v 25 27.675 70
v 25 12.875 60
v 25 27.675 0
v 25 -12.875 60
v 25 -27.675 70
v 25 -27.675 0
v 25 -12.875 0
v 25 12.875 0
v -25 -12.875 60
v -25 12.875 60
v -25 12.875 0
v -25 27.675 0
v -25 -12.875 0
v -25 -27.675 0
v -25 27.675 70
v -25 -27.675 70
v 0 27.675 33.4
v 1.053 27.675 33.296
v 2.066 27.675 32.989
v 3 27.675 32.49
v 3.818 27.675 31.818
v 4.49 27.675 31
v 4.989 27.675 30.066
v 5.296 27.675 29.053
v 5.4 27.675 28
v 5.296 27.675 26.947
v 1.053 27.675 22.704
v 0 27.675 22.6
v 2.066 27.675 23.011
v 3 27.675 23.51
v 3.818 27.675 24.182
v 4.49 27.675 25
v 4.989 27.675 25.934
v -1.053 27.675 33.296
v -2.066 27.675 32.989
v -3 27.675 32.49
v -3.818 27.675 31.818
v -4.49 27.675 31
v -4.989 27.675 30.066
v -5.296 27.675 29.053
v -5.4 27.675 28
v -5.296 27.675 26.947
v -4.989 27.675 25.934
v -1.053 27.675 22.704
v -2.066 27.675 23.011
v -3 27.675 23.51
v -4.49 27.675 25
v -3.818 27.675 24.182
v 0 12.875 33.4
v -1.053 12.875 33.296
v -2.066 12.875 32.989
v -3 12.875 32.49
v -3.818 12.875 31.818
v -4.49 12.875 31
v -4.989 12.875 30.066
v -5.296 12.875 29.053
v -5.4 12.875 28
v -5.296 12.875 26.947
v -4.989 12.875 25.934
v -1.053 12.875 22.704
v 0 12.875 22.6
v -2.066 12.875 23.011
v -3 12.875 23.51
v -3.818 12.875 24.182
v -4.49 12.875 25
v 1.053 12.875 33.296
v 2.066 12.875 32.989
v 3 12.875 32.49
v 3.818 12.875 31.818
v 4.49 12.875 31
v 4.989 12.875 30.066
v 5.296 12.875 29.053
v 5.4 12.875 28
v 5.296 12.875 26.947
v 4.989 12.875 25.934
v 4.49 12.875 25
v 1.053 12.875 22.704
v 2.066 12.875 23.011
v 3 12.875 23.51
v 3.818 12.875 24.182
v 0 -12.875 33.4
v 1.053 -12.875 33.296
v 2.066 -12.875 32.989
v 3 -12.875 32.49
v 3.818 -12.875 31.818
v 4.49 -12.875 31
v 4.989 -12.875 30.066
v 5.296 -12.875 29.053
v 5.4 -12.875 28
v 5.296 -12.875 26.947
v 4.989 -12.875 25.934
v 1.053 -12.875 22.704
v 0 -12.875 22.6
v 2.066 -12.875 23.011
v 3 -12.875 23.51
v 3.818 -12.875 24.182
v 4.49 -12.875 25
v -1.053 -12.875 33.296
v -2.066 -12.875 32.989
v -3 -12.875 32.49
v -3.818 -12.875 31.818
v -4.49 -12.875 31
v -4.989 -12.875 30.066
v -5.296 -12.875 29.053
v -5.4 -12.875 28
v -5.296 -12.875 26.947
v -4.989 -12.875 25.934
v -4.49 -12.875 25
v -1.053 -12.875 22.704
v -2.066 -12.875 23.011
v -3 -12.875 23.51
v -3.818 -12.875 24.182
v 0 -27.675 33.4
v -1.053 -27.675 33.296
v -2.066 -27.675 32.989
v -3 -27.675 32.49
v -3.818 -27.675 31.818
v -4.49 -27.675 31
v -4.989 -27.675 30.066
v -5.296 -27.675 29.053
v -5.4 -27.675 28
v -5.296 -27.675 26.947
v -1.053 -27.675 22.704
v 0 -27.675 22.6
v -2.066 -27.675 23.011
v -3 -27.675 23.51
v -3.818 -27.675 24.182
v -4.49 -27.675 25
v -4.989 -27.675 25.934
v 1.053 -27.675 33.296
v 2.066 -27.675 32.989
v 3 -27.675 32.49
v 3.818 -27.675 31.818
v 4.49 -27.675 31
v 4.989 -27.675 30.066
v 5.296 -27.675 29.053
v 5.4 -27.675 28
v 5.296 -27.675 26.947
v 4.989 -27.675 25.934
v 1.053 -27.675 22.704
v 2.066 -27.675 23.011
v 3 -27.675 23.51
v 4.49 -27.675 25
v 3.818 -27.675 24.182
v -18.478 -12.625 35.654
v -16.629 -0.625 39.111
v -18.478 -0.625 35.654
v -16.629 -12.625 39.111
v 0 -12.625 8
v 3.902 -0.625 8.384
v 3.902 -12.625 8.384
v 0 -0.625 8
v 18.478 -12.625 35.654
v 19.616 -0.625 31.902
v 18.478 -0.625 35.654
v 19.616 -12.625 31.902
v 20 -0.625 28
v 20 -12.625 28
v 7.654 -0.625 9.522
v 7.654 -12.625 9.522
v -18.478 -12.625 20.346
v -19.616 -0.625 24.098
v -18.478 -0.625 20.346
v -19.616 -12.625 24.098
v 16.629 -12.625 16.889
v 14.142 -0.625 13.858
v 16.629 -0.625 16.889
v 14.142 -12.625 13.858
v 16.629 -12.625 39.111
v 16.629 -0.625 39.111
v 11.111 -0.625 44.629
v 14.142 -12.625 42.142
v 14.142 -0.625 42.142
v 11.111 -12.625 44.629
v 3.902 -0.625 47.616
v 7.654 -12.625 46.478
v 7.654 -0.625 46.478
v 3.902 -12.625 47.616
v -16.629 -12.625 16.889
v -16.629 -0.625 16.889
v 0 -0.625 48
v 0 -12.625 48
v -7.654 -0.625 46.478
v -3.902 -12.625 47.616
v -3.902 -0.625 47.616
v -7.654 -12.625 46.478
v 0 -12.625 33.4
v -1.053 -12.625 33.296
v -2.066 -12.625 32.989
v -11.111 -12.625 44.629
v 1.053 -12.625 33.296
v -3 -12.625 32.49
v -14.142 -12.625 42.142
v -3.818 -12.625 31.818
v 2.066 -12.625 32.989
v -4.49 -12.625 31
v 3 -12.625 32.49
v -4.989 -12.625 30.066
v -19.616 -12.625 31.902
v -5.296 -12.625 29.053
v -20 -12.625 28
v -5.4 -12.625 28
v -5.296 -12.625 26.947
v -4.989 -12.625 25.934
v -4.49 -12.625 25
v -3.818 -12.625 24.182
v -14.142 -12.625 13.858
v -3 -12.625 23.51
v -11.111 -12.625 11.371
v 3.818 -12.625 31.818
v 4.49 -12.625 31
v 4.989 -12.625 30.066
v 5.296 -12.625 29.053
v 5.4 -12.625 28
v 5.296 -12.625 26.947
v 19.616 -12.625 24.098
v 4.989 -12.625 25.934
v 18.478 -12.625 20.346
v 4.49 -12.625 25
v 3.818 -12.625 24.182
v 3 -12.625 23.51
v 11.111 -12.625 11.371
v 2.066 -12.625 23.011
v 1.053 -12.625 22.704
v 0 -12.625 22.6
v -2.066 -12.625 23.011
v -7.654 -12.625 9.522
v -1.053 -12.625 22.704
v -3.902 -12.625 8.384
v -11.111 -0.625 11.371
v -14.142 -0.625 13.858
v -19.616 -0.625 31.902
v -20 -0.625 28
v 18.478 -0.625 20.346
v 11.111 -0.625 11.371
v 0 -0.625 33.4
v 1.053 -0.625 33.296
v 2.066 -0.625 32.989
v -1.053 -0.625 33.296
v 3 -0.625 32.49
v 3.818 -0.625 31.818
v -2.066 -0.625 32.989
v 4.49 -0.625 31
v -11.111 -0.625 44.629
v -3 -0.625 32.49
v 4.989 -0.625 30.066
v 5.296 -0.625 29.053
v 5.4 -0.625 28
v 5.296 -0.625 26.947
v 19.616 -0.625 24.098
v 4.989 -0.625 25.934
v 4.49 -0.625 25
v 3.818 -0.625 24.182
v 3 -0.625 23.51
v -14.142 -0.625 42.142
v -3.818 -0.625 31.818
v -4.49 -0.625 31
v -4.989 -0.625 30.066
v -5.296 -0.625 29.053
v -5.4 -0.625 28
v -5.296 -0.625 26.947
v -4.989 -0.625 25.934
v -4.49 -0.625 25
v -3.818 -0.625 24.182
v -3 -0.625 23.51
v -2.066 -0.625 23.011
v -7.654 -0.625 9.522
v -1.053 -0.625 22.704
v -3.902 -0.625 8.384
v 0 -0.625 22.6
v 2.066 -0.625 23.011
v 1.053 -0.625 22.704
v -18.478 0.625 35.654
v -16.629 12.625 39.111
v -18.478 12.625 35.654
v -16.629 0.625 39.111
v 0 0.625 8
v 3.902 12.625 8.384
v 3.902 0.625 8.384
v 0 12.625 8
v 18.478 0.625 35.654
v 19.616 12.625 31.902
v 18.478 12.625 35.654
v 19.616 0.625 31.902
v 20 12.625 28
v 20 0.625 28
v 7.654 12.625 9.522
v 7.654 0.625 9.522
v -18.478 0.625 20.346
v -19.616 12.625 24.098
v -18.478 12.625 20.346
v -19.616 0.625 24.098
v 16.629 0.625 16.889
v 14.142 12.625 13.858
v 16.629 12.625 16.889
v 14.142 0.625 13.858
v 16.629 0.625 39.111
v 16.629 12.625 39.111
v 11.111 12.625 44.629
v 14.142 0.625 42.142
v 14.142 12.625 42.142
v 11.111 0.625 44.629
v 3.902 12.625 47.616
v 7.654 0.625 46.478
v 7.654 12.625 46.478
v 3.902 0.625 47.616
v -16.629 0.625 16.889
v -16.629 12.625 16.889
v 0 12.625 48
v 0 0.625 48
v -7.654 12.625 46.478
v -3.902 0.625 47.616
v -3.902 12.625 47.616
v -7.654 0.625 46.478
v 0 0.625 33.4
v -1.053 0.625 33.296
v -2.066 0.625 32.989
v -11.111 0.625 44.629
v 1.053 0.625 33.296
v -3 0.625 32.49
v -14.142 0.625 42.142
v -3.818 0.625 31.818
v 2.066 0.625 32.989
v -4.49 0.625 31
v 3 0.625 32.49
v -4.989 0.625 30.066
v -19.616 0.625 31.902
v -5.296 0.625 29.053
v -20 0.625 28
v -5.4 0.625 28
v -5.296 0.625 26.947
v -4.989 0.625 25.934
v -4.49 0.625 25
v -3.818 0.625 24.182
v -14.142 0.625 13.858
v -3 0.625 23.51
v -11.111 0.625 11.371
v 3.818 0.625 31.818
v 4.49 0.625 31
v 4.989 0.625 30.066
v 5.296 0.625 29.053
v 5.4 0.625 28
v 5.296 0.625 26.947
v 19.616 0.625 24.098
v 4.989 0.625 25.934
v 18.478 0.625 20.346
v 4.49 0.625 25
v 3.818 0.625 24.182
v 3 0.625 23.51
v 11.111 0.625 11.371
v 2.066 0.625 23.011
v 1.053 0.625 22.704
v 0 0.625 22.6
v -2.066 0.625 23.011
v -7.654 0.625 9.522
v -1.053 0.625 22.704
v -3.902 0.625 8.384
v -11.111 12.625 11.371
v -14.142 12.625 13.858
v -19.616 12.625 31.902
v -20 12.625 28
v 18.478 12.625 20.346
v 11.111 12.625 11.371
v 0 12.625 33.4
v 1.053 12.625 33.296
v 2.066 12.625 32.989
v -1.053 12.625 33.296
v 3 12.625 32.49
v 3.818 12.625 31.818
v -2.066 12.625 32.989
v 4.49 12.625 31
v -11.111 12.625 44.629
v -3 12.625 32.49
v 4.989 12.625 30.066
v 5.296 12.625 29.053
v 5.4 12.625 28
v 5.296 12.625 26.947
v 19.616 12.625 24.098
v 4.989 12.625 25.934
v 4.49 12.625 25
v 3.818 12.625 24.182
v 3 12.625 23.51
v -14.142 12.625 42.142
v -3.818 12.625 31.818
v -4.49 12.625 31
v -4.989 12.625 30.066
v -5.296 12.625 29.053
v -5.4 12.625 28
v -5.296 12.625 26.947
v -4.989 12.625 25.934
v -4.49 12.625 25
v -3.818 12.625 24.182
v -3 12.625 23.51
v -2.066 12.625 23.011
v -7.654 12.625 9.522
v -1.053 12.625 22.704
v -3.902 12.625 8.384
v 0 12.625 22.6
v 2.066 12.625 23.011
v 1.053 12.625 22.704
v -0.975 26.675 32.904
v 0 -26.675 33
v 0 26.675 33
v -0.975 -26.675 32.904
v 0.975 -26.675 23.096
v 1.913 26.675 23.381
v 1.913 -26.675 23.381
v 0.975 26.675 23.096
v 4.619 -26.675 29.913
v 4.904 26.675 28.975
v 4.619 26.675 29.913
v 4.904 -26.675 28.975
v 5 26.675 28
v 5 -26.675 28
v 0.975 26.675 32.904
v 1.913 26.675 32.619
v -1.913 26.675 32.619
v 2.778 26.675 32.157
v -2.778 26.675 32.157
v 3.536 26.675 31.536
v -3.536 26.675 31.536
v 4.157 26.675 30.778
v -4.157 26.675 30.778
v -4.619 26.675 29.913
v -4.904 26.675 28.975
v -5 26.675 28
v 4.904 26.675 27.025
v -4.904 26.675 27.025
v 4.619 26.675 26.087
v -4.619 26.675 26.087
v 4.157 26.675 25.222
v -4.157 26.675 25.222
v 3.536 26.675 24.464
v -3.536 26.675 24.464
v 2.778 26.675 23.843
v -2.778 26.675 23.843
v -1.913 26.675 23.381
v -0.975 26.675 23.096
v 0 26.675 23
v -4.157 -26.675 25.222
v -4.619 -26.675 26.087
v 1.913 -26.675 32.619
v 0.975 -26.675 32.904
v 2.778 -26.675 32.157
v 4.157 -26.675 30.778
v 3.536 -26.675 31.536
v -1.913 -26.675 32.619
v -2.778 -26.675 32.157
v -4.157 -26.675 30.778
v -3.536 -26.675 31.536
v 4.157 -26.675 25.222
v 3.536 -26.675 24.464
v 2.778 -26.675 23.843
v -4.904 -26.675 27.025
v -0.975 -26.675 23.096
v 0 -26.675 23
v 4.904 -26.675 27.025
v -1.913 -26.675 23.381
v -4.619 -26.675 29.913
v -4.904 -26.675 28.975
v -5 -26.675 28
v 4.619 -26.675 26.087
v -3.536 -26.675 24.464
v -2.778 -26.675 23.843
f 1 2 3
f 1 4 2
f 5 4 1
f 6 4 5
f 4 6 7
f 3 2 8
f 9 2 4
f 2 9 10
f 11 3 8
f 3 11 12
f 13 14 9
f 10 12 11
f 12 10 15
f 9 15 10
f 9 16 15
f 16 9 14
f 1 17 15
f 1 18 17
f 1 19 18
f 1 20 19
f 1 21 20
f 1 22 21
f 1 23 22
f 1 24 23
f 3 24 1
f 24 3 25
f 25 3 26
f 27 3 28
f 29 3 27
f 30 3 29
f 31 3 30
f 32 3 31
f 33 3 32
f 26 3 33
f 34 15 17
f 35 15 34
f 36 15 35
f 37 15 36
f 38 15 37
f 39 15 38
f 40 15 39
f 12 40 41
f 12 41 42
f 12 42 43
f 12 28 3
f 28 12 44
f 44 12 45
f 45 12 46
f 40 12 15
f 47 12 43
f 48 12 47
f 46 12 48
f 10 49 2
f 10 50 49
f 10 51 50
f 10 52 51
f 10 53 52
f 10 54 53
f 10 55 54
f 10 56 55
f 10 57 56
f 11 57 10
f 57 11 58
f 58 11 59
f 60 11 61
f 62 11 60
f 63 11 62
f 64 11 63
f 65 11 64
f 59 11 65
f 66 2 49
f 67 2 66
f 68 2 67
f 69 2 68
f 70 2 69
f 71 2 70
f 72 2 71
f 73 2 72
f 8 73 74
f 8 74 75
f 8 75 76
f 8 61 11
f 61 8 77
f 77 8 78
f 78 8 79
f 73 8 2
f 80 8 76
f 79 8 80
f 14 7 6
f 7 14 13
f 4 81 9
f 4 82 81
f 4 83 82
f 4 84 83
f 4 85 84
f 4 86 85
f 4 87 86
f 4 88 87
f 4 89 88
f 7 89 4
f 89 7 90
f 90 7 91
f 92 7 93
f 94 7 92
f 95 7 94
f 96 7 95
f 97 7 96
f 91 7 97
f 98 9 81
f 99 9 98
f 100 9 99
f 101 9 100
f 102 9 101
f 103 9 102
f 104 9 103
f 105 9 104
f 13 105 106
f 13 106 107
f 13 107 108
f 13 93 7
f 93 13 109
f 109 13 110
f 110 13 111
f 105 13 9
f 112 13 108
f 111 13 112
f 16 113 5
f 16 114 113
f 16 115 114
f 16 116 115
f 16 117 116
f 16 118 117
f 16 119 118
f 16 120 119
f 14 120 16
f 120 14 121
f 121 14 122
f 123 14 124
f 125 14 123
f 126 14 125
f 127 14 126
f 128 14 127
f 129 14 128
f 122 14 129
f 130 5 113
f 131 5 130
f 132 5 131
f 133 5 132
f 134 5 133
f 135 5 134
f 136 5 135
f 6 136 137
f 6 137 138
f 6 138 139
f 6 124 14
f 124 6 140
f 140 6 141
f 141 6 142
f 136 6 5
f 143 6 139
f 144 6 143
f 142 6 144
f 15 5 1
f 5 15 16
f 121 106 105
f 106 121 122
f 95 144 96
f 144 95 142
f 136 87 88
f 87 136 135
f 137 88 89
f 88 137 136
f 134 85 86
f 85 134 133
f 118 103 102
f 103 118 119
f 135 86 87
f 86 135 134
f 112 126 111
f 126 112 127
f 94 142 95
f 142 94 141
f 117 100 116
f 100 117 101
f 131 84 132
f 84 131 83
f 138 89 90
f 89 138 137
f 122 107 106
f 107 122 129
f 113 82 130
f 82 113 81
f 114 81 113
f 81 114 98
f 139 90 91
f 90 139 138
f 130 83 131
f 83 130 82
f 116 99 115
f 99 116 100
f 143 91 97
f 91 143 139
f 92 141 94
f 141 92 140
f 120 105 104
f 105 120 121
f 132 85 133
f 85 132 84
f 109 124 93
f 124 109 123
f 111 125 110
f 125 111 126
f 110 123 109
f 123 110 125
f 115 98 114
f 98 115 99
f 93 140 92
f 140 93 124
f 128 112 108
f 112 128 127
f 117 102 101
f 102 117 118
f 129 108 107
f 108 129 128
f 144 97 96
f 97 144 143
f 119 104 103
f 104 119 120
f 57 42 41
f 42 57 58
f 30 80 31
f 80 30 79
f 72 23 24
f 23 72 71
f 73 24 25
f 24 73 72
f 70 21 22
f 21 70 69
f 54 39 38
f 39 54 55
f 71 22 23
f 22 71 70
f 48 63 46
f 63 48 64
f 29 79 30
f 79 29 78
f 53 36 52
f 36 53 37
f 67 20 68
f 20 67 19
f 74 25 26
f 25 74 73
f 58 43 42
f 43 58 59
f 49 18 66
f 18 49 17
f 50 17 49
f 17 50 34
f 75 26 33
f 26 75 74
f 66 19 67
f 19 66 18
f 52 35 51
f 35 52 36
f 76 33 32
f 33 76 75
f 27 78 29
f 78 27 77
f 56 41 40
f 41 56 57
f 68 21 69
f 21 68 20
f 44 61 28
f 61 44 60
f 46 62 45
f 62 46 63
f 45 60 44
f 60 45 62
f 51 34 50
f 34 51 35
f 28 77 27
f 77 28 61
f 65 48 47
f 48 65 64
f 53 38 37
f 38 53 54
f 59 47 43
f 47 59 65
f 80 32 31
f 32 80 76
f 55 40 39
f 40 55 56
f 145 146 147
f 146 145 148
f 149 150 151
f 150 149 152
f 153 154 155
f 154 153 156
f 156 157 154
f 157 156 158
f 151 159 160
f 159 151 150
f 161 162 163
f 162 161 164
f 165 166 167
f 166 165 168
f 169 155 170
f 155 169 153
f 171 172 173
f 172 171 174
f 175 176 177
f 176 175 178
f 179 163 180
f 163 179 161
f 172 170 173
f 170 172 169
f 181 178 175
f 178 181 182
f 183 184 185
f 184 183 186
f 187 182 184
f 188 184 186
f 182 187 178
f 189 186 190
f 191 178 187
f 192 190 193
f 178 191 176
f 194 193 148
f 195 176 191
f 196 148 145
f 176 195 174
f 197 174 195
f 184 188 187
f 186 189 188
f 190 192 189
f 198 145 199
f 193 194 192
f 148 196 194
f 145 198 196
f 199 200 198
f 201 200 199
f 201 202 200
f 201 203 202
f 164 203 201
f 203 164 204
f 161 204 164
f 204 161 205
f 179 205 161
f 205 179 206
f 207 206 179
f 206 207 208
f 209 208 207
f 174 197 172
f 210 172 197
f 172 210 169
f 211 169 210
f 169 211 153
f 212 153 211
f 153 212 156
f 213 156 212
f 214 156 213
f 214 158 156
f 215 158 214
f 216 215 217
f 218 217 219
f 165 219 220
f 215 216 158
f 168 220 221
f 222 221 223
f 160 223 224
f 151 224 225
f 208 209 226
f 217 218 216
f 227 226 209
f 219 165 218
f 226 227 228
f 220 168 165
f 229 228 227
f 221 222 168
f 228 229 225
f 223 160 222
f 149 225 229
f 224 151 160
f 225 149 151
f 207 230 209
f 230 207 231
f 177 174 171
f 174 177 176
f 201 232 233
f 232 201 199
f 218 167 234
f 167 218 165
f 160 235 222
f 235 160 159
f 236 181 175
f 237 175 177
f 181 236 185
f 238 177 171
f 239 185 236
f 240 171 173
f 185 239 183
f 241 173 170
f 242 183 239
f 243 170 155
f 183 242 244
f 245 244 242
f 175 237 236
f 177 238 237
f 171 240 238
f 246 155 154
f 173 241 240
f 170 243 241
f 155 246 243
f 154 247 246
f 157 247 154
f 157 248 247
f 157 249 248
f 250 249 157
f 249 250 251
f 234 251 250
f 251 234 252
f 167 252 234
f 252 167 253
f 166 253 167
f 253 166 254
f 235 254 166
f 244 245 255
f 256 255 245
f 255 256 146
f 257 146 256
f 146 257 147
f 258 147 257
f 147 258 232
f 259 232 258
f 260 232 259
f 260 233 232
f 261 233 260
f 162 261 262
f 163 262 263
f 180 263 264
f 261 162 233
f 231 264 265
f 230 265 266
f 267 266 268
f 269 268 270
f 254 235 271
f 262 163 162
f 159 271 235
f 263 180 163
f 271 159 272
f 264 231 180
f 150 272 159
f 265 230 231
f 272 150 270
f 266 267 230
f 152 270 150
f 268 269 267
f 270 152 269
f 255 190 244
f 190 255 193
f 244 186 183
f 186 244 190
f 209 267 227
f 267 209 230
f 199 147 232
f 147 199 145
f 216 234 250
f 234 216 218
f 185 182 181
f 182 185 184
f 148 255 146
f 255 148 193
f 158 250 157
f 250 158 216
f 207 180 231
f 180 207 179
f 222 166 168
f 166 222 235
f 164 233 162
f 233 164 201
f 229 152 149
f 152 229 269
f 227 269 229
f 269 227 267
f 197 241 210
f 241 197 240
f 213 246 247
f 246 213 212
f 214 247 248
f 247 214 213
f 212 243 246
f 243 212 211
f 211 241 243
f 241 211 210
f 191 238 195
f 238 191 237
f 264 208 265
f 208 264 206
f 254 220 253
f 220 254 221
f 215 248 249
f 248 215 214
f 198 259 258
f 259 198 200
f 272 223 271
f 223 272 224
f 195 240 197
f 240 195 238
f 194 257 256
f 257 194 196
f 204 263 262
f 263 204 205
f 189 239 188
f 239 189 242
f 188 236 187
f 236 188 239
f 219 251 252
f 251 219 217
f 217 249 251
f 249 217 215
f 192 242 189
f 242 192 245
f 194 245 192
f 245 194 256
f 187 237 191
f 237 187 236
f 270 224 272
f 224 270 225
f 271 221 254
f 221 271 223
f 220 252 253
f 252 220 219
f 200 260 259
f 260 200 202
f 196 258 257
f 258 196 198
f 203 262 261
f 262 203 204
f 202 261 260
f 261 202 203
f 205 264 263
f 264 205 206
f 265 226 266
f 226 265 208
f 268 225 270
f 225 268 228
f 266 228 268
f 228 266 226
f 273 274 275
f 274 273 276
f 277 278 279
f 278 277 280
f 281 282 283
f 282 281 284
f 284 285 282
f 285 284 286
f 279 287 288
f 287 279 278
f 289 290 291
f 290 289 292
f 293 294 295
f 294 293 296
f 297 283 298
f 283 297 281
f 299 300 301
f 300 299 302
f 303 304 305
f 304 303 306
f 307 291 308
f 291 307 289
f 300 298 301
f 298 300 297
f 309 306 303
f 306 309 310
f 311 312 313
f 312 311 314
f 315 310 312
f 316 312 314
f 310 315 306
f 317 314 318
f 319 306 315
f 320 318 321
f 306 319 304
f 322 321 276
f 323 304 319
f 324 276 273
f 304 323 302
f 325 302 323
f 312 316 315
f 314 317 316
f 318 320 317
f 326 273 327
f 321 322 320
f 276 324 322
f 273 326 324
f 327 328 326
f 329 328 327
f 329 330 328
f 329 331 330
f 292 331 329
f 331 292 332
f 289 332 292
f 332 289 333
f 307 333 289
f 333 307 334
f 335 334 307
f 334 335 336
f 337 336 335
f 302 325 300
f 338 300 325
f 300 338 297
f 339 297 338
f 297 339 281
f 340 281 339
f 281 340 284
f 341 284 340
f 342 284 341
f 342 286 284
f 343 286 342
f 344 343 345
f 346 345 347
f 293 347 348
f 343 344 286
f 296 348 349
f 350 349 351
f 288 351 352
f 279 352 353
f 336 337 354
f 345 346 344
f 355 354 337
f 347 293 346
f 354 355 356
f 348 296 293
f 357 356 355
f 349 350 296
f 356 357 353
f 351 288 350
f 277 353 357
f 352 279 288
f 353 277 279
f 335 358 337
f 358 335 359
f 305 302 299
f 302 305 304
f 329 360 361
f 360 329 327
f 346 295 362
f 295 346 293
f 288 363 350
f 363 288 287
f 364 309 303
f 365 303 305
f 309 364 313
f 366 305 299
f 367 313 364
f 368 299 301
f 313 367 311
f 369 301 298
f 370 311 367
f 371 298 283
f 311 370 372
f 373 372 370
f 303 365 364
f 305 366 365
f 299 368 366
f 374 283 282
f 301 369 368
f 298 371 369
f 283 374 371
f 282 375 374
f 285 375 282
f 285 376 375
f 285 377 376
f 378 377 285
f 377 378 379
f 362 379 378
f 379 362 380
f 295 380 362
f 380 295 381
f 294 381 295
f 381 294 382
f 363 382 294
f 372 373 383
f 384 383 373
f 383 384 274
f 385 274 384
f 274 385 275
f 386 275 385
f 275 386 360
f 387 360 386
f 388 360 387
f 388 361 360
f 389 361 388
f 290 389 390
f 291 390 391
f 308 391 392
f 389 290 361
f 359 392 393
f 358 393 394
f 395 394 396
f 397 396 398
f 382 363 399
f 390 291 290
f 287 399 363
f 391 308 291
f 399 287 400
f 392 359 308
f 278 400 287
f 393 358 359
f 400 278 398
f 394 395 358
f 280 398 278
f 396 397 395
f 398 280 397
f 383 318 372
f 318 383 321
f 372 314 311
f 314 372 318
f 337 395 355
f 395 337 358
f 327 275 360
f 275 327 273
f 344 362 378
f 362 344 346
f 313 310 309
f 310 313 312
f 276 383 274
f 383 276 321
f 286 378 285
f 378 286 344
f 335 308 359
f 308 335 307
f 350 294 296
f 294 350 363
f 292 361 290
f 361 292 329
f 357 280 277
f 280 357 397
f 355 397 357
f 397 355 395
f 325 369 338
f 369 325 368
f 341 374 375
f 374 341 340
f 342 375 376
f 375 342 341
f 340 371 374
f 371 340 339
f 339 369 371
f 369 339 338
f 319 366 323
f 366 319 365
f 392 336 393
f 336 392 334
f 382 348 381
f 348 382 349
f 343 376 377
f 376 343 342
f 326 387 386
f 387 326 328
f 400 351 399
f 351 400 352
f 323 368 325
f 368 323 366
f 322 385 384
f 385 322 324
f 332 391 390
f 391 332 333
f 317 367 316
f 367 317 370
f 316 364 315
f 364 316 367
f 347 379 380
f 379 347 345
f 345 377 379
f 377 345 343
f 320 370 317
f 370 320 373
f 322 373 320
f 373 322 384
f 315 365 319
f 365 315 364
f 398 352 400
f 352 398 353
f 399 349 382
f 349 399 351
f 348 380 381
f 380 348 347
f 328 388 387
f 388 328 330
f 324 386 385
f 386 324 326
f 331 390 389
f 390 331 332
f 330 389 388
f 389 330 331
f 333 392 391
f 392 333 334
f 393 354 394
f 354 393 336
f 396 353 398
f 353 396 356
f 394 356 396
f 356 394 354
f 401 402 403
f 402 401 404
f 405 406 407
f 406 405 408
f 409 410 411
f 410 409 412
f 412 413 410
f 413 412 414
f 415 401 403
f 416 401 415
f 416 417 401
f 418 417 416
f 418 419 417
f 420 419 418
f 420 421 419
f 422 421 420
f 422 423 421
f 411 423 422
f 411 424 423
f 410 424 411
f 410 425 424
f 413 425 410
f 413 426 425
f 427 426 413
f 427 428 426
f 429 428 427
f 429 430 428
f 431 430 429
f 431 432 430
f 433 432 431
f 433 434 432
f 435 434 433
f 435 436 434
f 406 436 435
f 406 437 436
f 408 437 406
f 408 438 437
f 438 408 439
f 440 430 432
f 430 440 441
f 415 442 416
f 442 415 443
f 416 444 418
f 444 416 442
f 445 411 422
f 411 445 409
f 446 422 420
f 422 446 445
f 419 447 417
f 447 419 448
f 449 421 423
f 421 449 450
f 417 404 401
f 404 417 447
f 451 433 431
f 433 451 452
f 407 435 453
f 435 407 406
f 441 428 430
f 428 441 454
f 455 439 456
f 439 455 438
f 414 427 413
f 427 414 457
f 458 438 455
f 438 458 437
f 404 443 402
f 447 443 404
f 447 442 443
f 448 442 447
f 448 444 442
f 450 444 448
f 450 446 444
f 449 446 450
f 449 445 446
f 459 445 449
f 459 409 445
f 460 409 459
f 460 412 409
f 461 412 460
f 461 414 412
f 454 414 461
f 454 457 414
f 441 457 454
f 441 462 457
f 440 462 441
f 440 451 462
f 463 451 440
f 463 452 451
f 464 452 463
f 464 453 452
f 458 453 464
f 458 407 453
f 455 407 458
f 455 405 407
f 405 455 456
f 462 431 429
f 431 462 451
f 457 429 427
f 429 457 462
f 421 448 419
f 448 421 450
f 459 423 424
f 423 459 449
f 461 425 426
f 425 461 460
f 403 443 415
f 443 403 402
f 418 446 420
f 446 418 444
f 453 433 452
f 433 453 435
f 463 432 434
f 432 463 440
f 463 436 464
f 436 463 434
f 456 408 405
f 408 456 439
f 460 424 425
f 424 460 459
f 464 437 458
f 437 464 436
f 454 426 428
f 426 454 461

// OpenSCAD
$fn = 32;

// ------------------------------------------------------------------------
// Trolley wheel set: wheels d40, fork 60 mm tall
// Every part is its own module, assembly() places every instance.
// ------------------------------------------------------------------------

// --- part 1 ---
module trolley_fork() {
  difference() {
    union() {
      translate([-25, 12.875, 0]) cube([50, 14.8, 60]);
      translate([-25, -27.675, 0]) cube([50, 14.8, 60]);
      translate([-25, -27.675, 60]) cube([50, 55.35, 10]);
    }
    translate([0, -20.275, 28]) rotate([90, 0, 0]) cylinder(h = 16.8, d = 10.8, center = true);
    translate([0, 20.275, 28]) rotate([90, 0, 0]) cylinder(h = 16.8, d = 10.8, center = true);
  }
}

// --- part 2 ---
module trolley_wheel() {
  difference() {
      translate([0, 0, 0]) cylinder(h = 12, d = 40);
      translate([0, 0, -1]) cylinder(h = 14, d = 10.8);
    }
}

// --- part 3 ---
module trolley_axle() {
  translate([0, 0, -26.675]) cylinder(h = 53.35, d = 10);
}

// --- assembly ---
module assembly() {
  color([0.80, 0.24, 0.20]) translate([0, 0, 0]) rotate([0, 0, 0]) trolley_fork();
  color([0.20, 0.45, 0.75]) translate([0, -0.625, 28]) rotate([90, 0, 0]) trolley_wheel();
  color([0.25, 0.62, 0.32]) translate([0, 12.625, 28]) rotate([90, 0, 0]) trolley_wheel();
  color([0.92, 0.70, 0.18]) translate([0, 0, 28]) rotate([90, 0, 0]) trolley_axle();
}

assembly();
